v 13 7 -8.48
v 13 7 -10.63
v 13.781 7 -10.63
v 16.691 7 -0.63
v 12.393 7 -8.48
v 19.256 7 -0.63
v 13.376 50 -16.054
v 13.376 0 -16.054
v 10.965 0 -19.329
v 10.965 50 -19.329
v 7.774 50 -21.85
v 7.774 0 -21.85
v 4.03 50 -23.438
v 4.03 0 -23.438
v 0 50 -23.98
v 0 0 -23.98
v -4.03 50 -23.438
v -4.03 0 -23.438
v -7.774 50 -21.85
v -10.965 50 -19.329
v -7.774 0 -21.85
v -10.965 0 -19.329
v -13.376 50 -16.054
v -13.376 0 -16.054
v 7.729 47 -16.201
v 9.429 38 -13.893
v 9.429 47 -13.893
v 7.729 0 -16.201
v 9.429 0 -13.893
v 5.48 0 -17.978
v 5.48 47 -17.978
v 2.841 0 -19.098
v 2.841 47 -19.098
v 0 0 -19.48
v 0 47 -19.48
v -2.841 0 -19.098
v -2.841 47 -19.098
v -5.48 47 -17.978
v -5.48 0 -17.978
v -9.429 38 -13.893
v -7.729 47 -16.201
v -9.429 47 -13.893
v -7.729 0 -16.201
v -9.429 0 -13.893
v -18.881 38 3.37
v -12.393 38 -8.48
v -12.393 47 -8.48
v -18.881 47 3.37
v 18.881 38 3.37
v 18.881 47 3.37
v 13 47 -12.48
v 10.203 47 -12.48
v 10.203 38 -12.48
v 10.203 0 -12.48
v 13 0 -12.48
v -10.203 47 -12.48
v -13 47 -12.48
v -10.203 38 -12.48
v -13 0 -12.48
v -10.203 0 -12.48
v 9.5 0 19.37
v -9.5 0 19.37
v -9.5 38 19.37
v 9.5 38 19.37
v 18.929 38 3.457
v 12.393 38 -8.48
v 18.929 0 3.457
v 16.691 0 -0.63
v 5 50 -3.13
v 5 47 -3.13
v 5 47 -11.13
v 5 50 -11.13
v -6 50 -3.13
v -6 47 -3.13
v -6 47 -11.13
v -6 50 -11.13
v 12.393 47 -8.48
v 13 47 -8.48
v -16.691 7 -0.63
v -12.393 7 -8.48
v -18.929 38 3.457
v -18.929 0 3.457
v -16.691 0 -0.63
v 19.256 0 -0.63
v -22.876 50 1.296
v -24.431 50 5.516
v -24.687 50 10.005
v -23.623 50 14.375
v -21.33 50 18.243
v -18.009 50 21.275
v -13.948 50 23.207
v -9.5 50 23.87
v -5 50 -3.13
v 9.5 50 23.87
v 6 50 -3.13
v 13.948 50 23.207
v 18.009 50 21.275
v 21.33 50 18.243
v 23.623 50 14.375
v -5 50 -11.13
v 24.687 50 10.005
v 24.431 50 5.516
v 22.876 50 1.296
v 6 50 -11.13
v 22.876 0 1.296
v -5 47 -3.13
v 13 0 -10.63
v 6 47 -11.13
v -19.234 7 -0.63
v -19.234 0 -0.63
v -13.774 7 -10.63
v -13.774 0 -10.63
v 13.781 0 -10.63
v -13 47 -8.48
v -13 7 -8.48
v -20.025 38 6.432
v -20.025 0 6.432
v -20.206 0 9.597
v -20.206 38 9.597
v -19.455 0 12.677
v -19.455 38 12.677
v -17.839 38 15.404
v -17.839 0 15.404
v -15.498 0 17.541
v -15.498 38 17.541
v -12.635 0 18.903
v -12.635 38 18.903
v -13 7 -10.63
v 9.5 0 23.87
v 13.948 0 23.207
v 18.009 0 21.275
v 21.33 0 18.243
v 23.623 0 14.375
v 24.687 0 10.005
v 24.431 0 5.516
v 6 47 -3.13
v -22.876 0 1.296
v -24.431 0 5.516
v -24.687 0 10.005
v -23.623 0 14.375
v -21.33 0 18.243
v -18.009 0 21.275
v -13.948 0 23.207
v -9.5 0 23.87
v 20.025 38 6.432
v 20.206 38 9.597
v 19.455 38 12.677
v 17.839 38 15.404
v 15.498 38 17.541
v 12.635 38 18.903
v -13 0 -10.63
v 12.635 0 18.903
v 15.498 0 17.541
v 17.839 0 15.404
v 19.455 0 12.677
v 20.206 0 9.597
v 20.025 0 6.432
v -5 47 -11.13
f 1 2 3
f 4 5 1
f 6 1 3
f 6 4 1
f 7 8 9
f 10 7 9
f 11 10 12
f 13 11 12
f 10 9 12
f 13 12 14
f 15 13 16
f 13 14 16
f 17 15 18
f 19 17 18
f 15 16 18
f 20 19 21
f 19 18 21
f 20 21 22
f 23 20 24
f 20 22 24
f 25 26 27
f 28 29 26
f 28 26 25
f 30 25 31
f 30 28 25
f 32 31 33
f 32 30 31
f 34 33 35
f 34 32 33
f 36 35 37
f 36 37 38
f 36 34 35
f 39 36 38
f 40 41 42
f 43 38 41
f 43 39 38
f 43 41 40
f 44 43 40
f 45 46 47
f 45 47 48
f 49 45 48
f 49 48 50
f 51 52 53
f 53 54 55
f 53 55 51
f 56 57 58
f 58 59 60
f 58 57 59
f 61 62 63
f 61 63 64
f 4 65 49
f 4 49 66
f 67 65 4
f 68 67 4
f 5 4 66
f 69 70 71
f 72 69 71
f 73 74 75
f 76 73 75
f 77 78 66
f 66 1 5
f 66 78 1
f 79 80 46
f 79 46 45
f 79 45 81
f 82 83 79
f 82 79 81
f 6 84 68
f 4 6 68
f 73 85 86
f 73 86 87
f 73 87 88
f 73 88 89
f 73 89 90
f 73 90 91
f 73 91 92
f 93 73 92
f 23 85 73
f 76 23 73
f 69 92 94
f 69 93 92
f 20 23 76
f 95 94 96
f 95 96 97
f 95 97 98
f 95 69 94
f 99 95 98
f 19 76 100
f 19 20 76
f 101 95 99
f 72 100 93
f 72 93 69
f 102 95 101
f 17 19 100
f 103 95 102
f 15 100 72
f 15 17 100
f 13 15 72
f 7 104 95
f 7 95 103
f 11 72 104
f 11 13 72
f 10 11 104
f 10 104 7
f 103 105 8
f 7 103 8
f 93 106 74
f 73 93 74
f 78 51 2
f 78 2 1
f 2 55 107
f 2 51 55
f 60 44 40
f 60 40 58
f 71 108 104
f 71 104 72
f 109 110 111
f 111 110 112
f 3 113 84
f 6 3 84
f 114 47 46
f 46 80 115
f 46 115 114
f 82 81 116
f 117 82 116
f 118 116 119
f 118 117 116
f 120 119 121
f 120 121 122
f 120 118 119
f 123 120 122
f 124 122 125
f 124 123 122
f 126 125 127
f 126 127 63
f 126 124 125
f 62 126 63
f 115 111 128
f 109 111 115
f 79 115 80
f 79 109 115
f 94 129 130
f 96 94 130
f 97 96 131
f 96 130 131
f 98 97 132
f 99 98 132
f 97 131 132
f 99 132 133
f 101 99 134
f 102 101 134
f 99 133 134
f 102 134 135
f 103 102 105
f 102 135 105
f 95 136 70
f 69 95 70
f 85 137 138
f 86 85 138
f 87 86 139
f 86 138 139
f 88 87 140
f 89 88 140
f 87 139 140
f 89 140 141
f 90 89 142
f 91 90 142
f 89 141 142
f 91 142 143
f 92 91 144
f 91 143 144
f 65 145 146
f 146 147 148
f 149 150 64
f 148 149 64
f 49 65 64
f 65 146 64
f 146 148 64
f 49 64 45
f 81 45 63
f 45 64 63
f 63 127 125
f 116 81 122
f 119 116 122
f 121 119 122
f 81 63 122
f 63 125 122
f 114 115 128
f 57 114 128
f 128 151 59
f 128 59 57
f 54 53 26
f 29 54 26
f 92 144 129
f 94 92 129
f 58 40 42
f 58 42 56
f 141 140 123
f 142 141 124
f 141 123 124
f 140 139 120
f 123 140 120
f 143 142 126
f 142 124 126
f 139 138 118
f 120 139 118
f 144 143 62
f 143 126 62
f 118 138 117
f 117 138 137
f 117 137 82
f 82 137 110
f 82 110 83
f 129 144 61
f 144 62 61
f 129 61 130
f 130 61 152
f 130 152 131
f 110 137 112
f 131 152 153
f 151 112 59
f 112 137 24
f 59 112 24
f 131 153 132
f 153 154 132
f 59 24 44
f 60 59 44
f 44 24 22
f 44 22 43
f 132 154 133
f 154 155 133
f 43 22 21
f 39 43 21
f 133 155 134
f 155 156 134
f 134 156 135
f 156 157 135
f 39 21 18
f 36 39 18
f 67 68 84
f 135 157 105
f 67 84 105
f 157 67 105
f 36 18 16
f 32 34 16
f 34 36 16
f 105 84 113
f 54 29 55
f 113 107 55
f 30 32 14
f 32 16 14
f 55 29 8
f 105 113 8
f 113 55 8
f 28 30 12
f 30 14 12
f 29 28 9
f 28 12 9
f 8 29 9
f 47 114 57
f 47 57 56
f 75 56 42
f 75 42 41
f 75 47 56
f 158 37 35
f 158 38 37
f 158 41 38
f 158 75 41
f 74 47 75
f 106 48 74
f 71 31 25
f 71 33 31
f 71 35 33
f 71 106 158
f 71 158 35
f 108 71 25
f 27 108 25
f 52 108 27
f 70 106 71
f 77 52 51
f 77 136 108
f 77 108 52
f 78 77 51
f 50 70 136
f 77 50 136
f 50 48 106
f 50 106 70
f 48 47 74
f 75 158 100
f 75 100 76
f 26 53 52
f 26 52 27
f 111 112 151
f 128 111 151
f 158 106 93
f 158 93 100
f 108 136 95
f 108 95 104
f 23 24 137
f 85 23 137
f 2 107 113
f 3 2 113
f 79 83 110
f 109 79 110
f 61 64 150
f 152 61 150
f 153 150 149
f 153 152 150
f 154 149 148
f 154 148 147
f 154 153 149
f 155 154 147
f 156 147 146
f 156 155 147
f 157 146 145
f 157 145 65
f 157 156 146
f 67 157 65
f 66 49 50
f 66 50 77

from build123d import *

# Parameters (mm, degrees)
RESSALTO_EXTRUS_O2_DEPTH = 50
CORTE_EXTRUS_O1_DEPTH    = 38
CORTE_EXTRUS_O3_DEPTH    = 47
ESBO_O5_W                = 1
ESBO_O5_H                = 8
CORTE_EXTRUS_O4_DEPTH    = 61.725636267
CORTE_EXTRUS_O5_DEPTH    = 7
CORTE_EXTRUS_O6_DEPTH    = 47


with BuildPart() as part:
    # Esboço1 → Ressalto-extrusão2 (new body)
    with BuildSketch(Plane(origin=(0, 0, 0), x_dir=(1, 0, 0), z_dir=(0, 1, 0))):
        with BuildLine():
            Line((-13.376104721, 16.054091922), (-22.876104721, -1.295908078))
            ThreePointArc((-22.876104721, -1.295908078), (-22.619735169, -16.393998269), (-9.5, -23.87))
            Line((-9.5, -23.87), (9.5, -23.87))
            ThreePointArc((9.5, -23.87), (22.619735169, -16.393998269), (22.876104721, -1.295908078))
            Line((22.876104721, -1.295908078), (13.376104721, 16.054091922))
            ThreePointArc((13.376104721, 16.054091922), (0, 23.98), (-13.376104721, 16.054091922))
        make_face()
    extrude(amount=RESSALTO_EXTRUS_O2_DEPTH)

    # Esboço3 → Corte-extrusão1 (cut)
    with BuildSketch(Plane.XZ):
        with BuildLine():
            Line((-9.5, 19.37), (9.5, 19.37))
            ThreePointArc((9.5, 19.37), (18.748337906, 14.100031567), (18.929057426, 3.45711553))
            Line((18.929057426, 3.45711553), (9.429057426, -13.89288447))
            ThreePointArc((9.429057426, -13.89288447), (0, -19.48), (-9.429057426, -13.89288447))
            Line((-9.429057426, -13.89288447), (-18.929057426, 3.45711553))
            ThreePointArc((-18.929057426, 3.45711553), (-18.748337906, 14.100031567), (-9.5, 19.37))
        make_face()
    extrude(amount=-CORTE_EXTRUS_O1_DEPTH, mode=Mode.SUBTRACT)

    # Esboço4 → Corte-extrusão3 (cut)
    with BuildSketch(Plane.XZ):
        with BuildLine():
            Line((0, 3.37), (18.88135728, 3.37))
            Line((18.88135728, 3.37), (9.429057426, -13.89288447))
            ThreePointArc((9.429057426, -13.89288447), (0, -19.48), (-9.429057426, -13.89288447))
            Line((-9.429057426, -13.89288447), (-18.88135728, 3.37))
            Line((-18.88135728, 3.37), (0, 3.37))
        make_face()
    extrude(amount=-CORTE_EXTRUS_O3_DEPTH, mode=Mode.SUBTRACT)

    # Esboço5 → Corte-extrusão4 (cut, through all)
    with BuildSketch(Plane(origin=(0, 0, 0), x_dir=(-1, 0, 0), z_dir=(0, -1, 0))):
        with Locations((-5.5, 7.13)):
            Rectangle(ESBO_O5_W, ESBO_O5_H)
        with Locations((5.5, 7.13)):
            Rectangle(ESBO_O5_W, ESBO_O5_H)
    extrude(amount=-CORTE_EXTRUS_O4_DEPTH, mode=Mode.SUBTRACT)

    # Esboço6 → Corte-extrusão5 (cut)
    with BuildSketch(Plane.XZ):
        Polygon((-13.774214885, -10.63), (13.780859913, -10.63), (19.256364236, -0.63), (2.792834358, -0.63), (-19.234396653, -0.63), align=None)
    extrude(amount=-CORTE_EXTRUS_O5_DEPTH, mode=Mode.SUBTRACT)

    # Esboço7 → Corte-extrusão6 (cut)
    with BuildSketch(Plane.XZ):
        Polygon((0, -12.48), (13, -12.48), (13, -8.48), (-13, -8.48), (-13, -12.48), align=None)
    extrude(amount=-CORTE_EXTRUS_O6_DEPTH, mode=Mode.SUBTRACT)


solid = part.part
